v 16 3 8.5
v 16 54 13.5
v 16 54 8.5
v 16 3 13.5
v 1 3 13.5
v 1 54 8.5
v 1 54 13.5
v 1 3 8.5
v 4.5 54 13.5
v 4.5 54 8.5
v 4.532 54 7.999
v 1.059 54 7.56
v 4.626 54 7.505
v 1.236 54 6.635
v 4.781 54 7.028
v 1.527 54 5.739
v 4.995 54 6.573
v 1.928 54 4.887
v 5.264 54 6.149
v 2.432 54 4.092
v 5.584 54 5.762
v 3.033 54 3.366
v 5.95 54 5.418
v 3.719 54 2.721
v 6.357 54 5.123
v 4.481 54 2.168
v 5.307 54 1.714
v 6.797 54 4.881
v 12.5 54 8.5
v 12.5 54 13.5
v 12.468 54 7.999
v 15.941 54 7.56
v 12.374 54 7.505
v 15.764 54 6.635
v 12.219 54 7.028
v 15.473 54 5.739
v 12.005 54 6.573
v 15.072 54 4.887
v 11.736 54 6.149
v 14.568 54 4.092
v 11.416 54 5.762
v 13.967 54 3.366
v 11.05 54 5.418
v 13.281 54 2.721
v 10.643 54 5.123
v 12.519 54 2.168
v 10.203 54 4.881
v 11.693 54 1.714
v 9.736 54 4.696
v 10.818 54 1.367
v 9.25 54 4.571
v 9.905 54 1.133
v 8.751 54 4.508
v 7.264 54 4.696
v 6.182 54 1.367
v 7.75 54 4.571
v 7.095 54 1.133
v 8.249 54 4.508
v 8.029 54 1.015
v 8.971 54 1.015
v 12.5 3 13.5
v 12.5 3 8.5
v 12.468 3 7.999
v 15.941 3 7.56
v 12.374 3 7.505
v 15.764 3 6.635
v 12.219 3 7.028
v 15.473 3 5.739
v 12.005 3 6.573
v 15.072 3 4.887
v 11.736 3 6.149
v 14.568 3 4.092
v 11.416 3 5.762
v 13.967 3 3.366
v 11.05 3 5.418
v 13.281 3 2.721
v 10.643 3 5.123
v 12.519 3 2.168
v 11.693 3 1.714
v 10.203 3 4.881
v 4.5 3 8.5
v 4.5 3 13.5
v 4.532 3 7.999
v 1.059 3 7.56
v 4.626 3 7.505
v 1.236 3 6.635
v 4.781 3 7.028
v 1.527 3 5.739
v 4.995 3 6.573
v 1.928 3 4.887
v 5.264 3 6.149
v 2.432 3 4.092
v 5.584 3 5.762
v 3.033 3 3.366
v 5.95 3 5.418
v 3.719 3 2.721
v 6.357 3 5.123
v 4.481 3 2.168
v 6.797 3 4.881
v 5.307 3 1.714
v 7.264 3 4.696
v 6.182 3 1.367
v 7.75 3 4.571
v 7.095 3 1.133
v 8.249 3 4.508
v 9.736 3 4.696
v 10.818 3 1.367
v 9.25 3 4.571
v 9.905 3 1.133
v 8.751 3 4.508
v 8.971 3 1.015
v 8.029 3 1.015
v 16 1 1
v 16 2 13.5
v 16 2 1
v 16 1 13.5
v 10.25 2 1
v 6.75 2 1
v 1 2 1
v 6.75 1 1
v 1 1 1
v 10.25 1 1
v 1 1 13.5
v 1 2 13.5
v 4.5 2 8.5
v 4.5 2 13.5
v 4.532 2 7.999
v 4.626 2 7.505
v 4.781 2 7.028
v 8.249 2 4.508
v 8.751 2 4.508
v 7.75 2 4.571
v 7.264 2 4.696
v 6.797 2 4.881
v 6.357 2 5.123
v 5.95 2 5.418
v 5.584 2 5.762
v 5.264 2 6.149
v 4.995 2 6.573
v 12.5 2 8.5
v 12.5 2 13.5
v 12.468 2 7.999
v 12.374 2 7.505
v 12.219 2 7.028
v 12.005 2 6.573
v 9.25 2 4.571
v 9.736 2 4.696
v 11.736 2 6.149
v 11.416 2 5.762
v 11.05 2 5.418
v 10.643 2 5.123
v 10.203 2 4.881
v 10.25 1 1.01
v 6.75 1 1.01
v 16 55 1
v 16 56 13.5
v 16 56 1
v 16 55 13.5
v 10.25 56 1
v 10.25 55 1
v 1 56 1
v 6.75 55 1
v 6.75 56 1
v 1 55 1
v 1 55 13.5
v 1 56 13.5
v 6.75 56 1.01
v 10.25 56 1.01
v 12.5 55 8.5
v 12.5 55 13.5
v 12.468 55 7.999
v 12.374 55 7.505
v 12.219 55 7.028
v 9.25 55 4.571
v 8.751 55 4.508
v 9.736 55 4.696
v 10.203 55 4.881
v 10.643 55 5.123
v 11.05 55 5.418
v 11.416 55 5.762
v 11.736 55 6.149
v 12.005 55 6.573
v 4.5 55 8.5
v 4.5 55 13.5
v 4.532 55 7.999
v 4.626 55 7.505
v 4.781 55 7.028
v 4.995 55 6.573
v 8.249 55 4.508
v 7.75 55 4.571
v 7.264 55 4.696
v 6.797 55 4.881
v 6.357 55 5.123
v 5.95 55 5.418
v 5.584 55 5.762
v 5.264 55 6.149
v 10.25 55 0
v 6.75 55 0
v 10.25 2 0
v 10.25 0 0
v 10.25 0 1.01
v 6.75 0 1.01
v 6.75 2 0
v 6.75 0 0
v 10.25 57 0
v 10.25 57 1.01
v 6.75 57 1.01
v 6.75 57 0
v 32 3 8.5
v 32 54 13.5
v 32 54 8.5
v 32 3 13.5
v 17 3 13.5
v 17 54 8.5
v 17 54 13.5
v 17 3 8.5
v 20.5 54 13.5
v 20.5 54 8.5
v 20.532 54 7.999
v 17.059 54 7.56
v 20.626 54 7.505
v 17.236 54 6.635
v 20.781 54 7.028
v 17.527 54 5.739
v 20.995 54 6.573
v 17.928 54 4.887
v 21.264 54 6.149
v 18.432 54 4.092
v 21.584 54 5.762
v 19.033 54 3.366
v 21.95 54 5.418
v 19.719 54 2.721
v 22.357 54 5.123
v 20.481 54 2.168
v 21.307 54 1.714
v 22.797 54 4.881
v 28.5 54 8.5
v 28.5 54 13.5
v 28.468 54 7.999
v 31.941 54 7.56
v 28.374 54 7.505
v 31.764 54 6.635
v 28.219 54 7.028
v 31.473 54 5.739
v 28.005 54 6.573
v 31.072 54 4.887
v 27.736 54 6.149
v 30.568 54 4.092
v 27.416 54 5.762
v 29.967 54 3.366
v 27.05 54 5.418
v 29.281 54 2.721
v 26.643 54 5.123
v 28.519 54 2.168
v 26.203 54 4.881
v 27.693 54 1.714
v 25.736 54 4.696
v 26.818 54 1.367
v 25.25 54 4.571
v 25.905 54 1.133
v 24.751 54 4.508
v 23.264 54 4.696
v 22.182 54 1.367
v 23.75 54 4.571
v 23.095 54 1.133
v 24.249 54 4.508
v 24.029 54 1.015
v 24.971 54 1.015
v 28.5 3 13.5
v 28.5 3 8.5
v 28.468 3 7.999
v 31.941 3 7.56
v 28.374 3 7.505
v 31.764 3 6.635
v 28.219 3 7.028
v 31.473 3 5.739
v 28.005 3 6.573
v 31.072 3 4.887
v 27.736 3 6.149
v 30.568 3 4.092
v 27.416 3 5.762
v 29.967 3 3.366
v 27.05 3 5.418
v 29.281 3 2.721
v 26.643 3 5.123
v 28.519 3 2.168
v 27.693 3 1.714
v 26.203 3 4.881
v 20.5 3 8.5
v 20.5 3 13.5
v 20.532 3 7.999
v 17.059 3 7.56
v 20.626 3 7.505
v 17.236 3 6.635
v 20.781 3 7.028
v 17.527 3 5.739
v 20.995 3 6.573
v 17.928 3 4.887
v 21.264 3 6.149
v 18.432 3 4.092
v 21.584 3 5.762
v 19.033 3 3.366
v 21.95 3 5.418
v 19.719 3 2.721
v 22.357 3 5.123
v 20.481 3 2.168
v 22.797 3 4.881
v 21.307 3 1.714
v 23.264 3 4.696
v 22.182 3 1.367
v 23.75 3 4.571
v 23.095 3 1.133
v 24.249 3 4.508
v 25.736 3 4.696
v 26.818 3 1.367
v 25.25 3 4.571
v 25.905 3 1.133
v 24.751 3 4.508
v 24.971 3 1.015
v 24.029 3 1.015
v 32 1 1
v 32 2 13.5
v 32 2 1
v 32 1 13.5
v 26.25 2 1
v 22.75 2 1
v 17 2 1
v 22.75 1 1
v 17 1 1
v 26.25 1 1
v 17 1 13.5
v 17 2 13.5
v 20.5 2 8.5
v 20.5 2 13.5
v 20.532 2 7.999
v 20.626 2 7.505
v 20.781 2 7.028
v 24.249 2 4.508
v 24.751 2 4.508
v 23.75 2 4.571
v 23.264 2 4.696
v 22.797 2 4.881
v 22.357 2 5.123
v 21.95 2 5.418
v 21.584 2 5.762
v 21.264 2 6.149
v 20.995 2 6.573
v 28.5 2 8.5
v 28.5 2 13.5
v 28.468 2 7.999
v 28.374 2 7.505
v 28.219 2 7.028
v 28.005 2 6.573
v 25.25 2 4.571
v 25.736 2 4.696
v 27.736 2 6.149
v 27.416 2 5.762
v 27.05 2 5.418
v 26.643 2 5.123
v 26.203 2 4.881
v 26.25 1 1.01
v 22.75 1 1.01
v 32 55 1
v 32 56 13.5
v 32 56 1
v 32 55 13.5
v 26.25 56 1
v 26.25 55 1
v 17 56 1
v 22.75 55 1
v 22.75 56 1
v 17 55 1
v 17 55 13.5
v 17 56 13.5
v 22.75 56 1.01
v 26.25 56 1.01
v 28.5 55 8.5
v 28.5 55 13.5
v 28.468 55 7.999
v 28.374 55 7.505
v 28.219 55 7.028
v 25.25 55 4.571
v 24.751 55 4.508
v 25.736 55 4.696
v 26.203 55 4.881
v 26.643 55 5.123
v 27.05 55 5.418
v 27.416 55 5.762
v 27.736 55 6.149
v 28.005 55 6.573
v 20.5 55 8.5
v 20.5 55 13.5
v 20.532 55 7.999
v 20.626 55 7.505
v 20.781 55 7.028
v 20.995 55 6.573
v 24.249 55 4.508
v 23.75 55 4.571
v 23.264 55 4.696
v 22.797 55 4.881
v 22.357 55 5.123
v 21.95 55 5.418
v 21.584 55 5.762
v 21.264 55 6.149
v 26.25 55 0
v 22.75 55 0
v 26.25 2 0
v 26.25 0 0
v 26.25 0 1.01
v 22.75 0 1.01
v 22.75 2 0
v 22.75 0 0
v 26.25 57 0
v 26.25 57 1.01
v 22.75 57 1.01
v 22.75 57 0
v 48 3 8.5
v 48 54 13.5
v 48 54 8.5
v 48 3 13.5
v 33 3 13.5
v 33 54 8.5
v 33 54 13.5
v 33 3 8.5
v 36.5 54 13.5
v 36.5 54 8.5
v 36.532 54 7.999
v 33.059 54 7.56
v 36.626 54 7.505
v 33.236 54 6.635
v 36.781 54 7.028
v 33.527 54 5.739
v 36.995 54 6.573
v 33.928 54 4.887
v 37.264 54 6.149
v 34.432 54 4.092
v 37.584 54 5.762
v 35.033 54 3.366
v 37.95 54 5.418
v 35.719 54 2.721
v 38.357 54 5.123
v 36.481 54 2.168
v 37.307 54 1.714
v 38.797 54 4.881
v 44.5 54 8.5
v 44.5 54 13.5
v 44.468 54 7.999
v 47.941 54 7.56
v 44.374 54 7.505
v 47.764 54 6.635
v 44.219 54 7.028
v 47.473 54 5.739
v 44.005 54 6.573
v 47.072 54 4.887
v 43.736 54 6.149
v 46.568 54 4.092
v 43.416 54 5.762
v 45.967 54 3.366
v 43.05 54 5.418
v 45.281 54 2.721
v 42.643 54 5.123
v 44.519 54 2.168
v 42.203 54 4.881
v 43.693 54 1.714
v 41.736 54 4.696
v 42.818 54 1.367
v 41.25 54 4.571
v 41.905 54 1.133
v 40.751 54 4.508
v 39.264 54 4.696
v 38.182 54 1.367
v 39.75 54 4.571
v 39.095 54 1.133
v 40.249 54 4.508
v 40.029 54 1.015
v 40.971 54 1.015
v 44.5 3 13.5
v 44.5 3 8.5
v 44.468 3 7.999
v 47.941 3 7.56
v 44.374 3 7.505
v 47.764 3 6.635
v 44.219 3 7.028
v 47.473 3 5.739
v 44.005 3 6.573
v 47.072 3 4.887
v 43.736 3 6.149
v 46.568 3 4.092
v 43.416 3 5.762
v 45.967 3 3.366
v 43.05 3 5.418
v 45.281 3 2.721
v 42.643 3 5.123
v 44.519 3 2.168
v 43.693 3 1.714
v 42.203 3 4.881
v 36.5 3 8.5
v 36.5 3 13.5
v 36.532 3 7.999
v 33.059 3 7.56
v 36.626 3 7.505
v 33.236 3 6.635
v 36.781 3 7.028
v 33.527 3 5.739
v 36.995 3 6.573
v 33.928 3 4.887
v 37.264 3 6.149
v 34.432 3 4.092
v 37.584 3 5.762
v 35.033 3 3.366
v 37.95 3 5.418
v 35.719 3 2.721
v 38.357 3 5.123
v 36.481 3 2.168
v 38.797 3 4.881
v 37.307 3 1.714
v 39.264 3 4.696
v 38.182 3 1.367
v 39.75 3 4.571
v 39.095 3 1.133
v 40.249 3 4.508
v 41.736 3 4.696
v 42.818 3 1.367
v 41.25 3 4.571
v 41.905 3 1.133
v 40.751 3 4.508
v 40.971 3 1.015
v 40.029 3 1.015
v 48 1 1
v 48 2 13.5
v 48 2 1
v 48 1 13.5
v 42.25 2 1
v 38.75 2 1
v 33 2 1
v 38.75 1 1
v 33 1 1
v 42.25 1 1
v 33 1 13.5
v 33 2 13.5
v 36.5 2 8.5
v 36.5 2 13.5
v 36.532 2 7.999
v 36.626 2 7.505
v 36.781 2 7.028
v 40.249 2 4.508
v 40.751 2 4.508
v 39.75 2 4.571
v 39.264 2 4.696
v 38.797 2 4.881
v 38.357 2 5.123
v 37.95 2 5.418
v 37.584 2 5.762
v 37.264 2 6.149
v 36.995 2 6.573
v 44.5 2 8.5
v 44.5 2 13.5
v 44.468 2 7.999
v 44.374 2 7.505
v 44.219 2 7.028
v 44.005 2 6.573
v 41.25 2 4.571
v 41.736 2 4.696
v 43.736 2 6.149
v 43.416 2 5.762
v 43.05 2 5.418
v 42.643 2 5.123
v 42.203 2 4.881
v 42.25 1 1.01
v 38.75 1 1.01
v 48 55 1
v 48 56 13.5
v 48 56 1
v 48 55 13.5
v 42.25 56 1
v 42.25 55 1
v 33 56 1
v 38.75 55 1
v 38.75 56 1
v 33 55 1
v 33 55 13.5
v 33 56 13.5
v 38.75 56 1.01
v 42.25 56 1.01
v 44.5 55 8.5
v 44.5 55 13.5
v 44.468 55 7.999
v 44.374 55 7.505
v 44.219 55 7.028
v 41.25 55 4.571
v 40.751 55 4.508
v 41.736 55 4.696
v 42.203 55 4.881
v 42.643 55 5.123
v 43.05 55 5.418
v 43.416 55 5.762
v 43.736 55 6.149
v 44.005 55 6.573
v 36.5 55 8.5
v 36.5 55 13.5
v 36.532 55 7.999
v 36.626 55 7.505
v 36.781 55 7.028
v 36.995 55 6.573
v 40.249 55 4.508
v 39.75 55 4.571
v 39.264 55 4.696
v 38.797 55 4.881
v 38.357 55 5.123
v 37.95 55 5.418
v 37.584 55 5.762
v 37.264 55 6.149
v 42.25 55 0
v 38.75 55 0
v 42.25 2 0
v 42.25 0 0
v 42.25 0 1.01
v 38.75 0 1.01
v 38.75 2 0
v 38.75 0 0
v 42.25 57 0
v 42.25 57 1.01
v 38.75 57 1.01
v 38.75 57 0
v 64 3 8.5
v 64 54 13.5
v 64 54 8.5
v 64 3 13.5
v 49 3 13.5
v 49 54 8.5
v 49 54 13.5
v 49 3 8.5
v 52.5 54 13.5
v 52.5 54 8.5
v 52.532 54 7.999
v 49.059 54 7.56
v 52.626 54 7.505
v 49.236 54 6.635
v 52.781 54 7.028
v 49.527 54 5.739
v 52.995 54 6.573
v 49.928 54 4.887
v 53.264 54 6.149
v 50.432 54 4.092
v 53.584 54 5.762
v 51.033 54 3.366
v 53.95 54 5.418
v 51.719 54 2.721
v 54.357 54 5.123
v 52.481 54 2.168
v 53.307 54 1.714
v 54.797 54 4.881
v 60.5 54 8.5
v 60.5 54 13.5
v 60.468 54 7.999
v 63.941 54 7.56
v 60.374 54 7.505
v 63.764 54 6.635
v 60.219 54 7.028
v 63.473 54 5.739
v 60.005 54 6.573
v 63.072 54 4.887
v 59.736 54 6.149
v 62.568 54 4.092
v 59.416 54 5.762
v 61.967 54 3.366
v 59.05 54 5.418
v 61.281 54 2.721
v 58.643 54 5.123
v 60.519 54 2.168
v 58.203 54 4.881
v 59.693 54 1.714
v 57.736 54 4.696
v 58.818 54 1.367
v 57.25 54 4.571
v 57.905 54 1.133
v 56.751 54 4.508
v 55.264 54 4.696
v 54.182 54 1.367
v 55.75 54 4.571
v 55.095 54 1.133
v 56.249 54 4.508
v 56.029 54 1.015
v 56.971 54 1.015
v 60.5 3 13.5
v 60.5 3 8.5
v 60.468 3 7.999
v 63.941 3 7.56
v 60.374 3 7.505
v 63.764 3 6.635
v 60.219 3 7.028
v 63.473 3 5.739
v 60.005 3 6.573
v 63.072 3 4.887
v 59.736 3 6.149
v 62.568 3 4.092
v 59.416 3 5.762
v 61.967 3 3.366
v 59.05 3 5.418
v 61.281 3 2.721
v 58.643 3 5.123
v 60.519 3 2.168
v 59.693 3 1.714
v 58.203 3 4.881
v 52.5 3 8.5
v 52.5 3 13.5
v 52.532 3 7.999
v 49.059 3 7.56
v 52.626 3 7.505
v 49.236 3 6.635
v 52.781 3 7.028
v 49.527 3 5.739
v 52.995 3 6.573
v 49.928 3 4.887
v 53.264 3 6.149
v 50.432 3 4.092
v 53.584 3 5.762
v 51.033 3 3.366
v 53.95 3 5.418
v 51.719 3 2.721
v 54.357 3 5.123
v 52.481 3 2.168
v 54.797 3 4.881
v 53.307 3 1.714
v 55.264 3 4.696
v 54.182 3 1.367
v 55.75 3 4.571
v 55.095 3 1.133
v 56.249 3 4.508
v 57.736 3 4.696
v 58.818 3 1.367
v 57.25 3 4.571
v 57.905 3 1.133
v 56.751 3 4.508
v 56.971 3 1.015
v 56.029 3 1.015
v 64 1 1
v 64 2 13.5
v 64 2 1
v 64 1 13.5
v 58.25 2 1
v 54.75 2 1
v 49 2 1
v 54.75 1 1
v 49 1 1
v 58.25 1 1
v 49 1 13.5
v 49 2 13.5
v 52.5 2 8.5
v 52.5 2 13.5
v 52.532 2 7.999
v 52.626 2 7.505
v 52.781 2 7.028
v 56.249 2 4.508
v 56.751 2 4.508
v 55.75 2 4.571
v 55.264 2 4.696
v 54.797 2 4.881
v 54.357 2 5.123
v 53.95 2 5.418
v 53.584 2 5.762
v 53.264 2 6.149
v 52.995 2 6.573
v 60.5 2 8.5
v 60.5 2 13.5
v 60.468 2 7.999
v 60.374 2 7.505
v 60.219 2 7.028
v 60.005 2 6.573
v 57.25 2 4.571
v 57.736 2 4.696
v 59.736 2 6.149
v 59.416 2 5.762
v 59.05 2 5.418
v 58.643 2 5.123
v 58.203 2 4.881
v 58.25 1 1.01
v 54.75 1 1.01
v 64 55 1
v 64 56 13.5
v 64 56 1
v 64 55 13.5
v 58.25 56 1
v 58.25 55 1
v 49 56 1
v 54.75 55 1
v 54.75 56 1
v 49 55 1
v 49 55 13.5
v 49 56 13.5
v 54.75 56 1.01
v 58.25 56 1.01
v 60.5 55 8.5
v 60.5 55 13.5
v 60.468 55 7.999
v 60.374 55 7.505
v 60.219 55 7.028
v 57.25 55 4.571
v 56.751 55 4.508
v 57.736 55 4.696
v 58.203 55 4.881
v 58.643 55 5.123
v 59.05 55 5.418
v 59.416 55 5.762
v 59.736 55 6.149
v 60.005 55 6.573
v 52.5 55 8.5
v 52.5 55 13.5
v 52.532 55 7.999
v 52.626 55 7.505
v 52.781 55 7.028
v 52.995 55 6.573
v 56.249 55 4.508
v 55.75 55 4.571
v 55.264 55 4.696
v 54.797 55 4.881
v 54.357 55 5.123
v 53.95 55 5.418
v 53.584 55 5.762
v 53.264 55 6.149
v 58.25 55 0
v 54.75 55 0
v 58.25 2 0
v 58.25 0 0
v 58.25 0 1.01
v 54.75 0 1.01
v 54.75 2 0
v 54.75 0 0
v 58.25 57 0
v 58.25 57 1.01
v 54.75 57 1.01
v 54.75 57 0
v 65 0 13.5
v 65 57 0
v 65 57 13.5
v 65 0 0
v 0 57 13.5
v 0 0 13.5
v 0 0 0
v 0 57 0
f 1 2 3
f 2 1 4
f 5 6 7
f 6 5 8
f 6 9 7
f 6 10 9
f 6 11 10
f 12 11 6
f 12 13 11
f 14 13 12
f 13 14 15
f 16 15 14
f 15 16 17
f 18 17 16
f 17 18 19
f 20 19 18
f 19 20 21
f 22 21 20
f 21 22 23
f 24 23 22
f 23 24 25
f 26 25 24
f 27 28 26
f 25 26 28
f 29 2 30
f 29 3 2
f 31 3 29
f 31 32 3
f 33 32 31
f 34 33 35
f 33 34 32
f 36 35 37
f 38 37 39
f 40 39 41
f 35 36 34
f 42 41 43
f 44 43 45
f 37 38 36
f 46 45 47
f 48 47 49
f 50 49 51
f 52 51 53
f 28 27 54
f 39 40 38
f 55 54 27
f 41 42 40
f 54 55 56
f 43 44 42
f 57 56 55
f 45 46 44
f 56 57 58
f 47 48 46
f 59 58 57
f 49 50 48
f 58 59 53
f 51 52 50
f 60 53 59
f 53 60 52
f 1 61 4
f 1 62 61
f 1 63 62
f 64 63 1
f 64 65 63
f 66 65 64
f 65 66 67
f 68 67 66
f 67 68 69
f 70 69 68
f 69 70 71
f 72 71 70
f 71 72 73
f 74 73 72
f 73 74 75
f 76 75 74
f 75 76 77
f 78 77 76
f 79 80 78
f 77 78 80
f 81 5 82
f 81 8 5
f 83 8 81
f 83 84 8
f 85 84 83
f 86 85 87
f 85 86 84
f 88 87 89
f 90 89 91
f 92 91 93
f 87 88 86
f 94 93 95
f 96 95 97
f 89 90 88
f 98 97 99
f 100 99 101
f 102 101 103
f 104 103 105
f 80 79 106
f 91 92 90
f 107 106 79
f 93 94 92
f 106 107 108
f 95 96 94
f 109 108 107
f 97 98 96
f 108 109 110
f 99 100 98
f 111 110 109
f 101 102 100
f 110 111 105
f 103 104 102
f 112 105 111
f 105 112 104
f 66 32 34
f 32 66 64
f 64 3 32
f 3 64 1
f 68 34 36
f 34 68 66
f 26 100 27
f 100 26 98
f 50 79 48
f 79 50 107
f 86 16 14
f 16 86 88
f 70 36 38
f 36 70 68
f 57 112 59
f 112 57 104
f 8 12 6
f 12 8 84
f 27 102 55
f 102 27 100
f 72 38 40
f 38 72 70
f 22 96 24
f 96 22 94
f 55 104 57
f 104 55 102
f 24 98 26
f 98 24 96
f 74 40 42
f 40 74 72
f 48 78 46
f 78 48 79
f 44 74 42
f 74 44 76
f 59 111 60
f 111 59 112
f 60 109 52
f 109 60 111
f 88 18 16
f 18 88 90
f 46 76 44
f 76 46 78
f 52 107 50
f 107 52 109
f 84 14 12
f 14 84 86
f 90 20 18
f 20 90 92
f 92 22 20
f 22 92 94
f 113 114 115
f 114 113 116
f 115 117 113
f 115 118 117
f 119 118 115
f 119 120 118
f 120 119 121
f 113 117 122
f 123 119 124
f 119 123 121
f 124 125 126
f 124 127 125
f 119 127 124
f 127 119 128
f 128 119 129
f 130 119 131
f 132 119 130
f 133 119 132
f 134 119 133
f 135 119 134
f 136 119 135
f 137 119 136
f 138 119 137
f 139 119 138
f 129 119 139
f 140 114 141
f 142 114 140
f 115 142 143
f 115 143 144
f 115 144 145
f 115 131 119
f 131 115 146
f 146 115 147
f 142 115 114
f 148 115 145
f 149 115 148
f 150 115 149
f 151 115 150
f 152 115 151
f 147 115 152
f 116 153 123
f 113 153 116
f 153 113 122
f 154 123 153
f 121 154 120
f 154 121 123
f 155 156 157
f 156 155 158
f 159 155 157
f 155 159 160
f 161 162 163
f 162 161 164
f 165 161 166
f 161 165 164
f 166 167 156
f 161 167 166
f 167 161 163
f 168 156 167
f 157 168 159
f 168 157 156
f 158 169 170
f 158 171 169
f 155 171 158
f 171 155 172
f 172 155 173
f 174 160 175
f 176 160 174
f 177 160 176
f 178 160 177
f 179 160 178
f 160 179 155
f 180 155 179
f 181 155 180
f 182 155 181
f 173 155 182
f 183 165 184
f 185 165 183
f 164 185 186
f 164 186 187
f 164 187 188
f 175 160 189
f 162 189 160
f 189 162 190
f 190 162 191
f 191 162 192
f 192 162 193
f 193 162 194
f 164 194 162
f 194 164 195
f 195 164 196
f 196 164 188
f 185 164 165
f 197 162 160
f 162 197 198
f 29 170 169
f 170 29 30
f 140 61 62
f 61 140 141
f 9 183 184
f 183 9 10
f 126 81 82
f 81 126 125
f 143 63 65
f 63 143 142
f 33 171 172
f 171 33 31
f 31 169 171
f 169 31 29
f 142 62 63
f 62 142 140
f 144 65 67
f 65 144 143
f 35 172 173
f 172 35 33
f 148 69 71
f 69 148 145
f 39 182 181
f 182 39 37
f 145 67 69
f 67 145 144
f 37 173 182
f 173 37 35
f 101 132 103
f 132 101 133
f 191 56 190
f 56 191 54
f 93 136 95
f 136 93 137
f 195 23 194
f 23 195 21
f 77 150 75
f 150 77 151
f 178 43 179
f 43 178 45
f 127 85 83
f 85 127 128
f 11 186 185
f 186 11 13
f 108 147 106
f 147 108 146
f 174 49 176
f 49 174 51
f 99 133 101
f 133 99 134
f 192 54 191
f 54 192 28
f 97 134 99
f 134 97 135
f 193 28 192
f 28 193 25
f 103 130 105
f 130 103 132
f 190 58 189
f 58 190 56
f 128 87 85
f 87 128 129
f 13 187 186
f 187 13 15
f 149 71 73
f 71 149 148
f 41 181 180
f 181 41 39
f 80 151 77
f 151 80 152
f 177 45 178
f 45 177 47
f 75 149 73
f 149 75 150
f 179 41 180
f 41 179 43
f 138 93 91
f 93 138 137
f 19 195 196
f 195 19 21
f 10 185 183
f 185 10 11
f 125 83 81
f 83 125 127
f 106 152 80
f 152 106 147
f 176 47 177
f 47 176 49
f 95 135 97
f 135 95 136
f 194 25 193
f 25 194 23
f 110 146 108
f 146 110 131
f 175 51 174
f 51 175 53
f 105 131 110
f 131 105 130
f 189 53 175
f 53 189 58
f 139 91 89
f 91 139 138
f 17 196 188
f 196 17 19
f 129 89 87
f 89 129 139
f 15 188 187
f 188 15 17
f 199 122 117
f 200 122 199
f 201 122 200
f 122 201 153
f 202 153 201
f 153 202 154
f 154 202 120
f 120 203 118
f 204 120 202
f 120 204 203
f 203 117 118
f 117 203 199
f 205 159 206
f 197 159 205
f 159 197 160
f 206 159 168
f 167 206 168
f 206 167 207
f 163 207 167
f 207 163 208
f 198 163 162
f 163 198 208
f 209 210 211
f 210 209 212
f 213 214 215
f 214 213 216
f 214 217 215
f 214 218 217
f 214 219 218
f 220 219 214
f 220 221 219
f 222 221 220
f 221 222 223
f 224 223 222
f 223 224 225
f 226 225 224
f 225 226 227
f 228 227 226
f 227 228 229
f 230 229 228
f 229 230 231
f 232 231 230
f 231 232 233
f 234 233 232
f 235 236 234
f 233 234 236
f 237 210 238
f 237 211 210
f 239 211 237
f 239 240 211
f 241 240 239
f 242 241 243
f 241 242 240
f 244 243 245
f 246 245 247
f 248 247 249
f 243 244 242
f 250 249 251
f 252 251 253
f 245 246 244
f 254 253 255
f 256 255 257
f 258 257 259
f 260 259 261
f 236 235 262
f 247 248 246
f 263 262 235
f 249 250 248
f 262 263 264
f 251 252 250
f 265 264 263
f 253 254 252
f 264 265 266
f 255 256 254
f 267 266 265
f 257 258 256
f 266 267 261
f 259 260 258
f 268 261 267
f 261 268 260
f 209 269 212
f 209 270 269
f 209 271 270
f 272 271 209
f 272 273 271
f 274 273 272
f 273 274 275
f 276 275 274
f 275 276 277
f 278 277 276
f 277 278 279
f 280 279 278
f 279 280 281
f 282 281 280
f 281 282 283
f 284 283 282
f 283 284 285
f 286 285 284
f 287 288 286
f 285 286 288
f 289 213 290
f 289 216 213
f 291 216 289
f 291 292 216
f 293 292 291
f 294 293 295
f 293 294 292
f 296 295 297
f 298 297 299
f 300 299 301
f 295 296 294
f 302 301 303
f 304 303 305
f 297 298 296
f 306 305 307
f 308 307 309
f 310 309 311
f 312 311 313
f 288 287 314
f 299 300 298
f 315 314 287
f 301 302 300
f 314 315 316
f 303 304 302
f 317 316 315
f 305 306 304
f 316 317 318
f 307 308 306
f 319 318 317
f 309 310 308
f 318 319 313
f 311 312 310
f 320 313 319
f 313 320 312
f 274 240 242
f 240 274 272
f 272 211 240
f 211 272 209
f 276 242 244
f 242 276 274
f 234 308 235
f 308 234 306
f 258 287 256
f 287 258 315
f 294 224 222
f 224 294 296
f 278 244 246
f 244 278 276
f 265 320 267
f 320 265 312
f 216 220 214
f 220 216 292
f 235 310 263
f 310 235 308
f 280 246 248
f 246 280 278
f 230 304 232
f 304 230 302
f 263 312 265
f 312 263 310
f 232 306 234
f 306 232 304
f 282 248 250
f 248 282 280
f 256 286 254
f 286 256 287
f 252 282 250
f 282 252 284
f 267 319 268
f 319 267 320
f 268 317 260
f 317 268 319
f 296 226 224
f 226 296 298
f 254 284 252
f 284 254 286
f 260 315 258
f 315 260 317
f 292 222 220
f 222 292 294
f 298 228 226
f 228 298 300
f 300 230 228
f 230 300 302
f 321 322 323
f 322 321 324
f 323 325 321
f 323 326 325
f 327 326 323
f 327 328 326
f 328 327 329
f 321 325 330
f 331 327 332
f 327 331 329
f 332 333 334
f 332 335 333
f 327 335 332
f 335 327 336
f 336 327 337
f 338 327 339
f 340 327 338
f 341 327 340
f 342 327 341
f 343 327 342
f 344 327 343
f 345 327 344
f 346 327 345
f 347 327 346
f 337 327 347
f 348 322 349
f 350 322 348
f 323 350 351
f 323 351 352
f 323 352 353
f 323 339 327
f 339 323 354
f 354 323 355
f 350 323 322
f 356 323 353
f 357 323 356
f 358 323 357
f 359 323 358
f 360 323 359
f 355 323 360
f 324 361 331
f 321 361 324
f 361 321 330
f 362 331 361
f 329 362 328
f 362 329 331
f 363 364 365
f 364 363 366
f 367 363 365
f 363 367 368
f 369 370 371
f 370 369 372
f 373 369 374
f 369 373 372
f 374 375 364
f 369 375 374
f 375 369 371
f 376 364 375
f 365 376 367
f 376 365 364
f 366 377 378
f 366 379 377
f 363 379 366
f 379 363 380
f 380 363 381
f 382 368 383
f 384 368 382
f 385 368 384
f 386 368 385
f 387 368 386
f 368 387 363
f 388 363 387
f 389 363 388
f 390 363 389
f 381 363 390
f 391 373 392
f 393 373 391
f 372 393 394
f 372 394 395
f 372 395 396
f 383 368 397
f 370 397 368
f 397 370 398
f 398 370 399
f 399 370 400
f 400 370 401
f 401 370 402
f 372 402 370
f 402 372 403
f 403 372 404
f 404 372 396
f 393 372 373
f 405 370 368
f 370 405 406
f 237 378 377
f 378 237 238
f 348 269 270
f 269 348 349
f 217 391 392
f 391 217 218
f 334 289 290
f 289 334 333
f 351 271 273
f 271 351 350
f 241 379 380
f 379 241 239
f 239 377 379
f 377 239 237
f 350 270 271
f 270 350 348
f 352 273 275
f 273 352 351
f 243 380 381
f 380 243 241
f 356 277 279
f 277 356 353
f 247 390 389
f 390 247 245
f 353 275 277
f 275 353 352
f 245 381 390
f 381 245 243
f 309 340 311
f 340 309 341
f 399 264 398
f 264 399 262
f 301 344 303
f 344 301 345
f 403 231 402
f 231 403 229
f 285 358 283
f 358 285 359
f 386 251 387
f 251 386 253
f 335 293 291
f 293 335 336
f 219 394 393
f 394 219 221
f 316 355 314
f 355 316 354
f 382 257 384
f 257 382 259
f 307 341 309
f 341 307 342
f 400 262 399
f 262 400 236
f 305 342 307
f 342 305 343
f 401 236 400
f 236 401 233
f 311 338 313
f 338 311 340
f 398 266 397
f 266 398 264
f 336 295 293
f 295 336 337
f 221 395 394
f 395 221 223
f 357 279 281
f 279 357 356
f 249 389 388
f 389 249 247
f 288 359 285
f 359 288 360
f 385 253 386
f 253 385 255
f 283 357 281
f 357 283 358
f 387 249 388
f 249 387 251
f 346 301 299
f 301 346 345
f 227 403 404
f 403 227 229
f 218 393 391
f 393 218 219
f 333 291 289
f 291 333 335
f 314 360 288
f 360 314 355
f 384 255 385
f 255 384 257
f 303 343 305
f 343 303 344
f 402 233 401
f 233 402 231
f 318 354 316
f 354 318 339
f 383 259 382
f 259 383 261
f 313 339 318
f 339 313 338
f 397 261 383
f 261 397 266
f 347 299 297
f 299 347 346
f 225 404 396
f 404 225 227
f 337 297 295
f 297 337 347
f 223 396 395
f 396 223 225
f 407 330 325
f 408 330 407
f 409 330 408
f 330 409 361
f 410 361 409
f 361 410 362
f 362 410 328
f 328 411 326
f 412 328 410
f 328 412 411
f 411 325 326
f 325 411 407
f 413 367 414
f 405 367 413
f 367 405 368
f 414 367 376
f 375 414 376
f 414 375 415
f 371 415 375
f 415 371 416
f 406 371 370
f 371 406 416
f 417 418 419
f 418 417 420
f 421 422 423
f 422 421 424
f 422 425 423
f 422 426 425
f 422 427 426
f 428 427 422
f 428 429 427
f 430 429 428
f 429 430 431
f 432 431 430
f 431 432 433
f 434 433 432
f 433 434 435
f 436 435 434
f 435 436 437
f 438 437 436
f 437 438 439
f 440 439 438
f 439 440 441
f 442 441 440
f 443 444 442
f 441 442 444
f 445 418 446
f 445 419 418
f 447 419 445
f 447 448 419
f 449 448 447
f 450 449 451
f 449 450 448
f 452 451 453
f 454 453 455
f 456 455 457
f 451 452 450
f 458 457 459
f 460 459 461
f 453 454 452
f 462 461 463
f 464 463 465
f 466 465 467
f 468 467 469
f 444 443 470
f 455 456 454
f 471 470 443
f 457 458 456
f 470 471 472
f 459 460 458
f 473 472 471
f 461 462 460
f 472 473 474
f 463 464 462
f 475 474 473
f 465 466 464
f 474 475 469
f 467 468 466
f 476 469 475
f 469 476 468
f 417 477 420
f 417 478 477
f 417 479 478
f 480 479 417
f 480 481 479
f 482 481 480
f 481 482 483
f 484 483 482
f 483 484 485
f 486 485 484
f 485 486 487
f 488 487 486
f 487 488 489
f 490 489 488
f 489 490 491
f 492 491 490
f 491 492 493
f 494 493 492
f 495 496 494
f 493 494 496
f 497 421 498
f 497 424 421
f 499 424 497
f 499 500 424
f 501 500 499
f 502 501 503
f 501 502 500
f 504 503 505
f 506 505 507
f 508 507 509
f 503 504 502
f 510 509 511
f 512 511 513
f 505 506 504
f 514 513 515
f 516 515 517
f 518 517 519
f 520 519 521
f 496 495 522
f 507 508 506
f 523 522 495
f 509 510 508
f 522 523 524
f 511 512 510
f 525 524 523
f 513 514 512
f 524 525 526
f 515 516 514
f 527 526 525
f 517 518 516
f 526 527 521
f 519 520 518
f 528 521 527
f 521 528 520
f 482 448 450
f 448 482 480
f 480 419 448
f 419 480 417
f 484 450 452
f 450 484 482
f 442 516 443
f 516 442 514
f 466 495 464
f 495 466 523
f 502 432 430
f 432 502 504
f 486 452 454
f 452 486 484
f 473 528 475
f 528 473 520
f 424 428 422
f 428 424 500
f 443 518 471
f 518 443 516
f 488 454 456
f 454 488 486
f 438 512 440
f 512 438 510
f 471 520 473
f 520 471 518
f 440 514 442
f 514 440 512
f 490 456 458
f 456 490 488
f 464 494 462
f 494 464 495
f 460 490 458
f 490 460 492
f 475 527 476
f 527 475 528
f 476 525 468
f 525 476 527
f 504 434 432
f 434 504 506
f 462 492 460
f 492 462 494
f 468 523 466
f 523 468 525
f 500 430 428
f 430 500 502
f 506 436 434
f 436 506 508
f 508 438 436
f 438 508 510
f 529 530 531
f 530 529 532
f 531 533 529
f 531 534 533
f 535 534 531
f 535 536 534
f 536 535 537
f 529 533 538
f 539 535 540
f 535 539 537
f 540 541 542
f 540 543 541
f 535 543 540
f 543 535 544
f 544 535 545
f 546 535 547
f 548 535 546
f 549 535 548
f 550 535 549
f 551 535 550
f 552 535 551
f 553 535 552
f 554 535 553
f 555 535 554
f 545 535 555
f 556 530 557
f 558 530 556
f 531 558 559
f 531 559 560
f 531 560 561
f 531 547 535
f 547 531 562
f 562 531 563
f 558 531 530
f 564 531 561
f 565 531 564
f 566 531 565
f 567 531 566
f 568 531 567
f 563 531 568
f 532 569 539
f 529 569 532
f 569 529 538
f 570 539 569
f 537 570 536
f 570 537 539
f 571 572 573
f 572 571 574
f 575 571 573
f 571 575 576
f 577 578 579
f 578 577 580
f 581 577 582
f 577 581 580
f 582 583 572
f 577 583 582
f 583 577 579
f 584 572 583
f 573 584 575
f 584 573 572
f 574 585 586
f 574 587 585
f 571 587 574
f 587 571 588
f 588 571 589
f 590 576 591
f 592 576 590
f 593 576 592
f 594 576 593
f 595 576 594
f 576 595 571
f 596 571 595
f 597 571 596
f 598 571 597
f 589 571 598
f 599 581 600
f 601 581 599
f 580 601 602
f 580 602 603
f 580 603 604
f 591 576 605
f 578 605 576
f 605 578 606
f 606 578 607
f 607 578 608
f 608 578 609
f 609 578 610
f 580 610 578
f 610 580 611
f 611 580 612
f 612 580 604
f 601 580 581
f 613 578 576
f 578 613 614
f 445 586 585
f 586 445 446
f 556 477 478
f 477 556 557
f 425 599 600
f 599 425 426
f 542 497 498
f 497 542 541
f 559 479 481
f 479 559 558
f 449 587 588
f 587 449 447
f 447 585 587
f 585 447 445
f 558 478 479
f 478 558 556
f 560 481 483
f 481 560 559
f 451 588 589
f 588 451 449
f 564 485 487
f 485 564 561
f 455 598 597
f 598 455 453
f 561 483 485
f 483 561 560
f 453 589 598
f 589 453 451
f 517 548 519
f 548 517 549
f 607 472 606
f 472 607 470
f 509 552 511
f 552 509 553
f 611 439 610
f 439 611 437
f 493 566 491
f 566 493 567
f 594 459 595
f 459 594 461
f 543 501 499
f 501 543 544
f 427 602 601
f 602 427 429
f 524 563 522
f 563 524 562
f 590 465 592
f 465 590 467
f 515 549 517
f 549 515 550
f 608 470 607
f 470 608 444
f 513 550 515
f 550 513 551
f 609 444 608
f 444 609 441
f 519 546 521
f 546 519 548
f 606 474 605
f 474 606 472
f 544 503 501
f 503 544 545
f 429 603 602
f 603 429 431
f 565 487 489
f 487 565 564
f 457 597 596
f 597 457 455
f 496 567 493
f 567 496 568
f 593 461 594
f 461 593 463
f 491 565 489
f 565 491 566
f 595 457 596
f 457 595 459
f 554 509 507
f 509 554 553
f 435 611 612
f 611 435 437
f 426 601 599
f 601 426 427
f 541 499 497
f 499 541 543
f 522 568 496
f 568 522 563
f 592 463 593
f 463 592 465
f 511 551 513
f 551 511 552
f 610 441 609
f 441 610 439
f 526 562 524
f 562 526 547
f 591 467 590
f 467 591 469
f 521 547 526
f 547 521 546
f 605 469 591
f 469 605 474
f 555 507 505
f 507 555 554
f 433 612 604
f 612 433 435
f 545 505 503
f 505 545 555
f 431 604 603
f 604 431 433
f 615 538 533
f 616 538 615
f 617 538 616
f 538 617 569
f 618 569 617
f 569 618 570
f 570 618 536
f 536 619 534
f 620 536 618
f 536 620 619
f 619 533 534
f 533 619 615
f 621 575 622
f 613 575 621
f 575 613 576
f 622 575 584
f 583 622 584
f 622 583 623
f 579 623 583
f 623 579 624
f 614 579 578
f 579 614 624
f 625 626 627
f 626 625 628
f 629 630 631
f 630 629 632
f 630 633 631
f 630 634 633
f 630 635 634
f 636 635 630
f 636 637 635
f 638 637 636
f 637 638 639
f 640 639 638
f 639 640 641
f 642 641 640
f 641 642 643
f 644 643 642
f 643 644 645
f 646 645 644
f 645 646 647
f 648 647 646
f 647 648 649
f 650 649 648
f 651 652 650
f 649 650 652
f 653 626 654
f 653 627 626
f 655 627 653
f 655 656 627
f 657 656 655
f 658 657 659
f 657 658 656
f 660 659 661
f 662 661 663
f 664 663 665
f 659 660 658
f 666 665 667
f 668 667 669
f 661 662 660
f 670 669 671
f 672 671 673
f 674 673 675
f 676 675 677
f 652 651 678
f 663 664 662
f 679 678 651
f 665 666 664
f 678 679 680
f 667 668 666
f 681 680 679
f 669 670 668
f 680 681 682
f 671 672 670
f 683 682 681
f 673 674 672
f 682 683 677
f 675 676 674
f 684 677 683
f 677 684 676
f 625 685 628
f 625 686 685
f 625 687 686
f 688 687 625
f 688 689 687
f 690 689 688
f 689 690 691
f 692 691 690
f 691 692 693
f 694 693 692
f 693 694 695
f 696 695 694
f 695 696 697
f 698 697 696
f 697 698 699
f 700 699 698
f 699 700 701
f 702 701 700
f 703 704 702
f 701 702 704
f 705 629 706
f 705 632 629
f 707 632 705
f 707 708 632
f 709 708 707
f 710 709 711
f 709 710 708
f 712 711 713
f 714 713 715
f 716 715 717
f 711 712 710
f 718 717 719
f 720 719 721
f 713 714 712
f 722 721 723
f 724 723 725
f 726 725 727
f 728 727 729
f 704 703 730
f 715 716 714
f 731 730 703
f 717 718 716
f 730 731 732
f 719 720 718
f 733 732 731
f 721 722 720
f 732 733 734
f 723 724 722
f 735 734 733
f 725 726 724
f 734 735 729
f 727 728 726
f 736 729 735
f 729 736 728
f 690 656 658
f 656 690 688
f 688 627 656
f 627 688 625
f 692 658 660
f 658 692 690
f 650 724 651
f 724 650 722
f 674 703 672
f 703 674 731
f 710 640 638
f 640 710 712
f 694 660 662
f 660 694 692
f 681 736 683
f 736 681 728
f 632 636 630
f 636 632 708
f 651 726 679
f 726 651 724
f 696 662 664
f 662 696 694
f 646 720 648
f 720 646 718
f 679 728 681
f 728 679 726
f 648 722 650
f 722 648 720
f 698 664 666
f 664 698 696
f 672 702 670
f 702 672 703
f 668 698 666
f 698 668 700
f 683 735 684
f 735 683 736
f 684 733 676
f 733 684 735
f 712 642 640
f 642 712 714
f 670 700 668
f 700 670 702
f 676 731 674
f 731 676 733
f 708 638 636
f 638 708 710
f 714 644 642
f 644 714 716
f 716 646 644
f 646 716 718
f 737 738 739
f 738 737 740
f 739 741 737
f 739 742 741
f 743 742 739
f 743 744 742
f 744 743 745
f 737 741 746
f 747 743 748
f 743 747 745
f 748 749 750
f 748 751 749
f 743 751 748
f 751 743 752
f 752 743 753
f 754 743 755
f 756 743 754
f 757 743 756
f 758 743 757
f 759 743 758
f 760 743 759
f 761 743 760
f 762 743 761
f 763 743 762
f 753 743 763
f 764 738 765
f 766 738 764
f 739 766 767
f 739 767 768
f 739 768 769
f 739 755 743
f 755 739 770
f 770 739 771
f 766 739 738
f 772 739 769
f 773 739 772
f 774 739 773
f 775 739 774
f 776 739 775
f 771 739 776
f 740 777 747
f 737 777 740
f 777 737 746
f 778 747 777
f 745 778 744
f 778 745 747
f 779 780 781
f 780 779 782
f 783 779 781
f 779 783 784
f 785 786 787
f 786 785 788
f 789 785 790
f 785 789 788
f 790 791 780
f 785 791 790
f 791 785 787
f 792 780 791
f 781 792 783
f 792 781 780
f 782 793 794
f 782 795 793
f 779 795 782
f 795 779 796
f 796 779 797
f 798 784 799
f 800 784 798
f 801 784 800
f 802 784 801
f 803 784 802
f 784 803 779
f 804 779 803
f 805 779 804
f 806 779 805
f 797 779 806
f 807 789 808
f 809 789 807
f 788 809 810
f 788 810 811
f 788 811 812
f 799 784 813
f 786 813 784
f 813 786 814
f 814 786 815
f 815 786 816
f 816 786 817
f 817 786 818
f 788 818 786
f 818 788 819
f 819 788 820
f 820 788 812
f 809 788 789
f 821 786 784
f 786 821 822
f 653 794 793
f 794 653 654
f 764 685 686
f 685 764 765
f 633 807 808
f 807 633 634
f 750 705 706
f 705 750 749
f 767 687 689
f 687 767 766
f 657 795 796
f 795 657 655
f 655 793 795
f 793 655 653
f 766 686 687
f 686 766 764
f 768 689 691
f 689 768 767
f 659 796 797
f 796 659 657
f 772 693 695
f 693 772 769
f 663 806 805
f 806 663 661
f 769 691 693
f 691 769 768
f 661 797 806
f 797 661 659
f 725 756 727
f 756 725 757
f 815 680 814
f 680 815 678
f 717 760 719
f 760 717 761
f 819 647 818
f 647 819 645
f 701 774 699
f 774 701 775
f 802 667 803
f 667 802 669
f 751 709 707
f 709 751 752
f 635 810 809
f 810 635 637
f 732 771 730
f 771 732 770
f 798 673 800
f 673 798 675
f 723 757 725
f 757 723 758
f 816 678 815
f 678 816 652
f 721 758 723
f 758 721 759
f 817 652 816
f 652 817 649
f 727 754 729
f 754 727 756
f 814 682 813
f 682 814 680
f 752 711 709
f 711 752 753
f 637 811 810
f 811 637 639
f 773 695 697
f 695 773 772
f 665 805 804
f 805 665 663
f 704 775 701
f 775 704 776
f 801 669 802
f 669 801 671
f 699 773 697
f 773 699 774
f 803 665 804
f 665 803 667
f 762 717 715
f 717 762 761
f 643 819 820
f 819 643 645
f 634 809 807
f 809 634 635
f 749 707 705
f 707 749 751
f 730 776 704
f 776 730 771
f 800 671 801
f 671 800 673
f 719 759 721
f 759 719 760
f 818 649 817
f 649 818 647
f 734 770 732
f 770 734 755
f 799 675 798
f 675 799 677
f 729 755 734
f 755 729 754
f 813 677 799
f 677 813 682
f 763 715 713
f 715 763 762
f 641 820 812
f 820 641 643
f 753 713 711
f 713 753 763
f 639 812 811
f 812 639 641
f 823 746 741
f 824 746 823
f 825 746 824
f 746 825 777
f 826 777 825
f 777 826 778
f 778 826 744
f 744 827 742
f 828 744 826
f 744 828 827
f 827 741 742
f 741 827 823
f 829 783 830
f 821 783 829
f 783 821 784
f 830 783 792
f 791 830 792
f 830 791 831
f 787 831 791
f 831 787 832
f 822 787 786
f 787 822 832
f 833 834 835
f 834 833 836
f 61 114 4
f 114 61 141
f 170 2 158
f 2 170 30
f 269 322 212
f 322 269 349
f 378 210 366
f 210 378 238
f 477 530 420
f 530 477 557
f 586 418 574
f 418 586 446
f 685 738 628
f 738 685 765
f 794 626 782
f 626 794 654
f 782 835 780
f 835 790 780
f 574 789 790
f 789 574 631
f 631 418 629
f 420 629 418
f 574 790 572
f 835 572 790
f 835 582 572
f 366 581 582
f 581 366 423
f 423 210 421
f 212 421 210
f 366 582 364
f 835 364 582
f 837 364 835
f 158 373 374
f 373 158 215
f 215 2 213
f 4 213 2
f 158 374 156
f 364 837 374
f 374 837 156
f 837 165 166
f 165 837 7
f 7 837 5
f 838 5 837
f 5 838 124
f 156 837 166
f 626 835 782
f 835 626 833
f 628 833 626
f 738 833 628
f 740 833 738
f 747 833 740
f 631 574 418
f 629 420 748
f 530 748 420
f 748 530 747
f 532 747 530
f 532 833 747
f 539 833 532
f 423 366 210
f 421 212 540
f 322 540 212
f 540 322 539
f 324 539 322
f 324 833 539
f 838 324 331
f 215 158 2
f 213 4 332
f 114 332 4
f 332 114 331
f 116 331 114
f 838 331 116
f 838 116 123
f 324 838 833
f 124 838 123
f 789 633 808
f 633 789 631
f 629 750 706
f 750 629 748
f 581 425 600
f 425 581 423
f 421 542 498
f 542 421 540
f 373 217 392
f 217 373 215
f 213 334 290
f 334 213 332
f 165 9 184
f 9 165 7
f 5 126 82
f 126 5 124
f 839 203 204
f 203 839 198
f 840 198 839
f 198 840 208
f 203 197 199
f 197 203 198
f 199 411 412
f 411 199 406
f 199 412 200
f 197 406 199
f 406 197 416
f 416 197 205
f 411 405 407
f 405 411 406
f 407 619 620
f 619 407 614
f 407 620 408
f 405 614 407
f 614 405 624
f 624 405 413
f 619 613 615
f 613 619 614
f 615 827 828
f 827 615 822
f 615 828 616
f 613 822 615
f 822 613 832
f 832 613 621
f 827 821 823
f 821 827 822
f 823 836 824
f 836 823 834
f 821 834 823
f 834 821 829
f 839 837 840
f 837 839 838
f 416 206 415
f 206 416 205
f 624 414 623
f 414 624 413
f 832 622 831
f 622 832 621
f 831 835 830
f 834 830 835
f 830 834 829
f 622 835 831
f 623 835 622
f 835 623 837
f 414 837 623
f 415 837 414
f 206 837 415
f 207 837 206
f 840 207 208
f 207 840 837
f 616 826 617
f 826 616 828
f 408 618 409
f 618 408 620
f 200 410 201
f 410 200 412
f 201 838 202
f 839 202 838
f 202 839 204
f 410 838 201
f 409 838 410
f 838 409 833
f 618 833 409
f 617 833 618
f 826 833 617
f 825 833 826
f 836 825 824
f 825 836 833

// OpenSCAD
$fn = 50;

e = 0.01;

t = 1;
d = 15;
d2 = 8;
h = 12.5;
l = 55;
tab = 3.5;

// number of batteries
n = 4;

w = n*(d+t) + t;


module battery () {
    translate([t+d/2,t,t+d/2])
    difference() {
    union() {
        // main battery body
        translate([-d/2,2*t,0])
        cube([d,l-4*t,d/2]);
        
        translate([0,2*t,0])
        rotate([-90,0,0])
        cylinder(l-4*t,d/2,d/2);
        
        // terminals
        translate([-d/2,0,-d/2])
        cube([d,t,d]);
        
        translate([-d/2,l-t,-d/2])
        cube([d,t,d]);
        
        // terminal contacts
        translate([-d2/2,0,0])
        cube([d2,l,d/2]);
        
        rotate([-90,0,0])
        cylinder(l,d2/2,d2/2);
        
        // terminal tabs
        translate([-tab/2,-t-e,-d/2-t*3+e])
        cube([tab,t*2+e,t*3]);
        
        translate([-tab/2,l-t,-d/2-t*3+e])
        cube([tab,t*2+e,t*3]);
    }
    /*
    translate([-d/2-e,t,-d/2-e])
        cube([d+2*e,t,d+2*e]);
    }
    */
}
    
}

difference() {
    cube([w,l+2*t,h+t]);

    for(i=[0:n-1]) {
        translate([i*(d+t),0,0])
        battery();
    }
}

//!battery();
